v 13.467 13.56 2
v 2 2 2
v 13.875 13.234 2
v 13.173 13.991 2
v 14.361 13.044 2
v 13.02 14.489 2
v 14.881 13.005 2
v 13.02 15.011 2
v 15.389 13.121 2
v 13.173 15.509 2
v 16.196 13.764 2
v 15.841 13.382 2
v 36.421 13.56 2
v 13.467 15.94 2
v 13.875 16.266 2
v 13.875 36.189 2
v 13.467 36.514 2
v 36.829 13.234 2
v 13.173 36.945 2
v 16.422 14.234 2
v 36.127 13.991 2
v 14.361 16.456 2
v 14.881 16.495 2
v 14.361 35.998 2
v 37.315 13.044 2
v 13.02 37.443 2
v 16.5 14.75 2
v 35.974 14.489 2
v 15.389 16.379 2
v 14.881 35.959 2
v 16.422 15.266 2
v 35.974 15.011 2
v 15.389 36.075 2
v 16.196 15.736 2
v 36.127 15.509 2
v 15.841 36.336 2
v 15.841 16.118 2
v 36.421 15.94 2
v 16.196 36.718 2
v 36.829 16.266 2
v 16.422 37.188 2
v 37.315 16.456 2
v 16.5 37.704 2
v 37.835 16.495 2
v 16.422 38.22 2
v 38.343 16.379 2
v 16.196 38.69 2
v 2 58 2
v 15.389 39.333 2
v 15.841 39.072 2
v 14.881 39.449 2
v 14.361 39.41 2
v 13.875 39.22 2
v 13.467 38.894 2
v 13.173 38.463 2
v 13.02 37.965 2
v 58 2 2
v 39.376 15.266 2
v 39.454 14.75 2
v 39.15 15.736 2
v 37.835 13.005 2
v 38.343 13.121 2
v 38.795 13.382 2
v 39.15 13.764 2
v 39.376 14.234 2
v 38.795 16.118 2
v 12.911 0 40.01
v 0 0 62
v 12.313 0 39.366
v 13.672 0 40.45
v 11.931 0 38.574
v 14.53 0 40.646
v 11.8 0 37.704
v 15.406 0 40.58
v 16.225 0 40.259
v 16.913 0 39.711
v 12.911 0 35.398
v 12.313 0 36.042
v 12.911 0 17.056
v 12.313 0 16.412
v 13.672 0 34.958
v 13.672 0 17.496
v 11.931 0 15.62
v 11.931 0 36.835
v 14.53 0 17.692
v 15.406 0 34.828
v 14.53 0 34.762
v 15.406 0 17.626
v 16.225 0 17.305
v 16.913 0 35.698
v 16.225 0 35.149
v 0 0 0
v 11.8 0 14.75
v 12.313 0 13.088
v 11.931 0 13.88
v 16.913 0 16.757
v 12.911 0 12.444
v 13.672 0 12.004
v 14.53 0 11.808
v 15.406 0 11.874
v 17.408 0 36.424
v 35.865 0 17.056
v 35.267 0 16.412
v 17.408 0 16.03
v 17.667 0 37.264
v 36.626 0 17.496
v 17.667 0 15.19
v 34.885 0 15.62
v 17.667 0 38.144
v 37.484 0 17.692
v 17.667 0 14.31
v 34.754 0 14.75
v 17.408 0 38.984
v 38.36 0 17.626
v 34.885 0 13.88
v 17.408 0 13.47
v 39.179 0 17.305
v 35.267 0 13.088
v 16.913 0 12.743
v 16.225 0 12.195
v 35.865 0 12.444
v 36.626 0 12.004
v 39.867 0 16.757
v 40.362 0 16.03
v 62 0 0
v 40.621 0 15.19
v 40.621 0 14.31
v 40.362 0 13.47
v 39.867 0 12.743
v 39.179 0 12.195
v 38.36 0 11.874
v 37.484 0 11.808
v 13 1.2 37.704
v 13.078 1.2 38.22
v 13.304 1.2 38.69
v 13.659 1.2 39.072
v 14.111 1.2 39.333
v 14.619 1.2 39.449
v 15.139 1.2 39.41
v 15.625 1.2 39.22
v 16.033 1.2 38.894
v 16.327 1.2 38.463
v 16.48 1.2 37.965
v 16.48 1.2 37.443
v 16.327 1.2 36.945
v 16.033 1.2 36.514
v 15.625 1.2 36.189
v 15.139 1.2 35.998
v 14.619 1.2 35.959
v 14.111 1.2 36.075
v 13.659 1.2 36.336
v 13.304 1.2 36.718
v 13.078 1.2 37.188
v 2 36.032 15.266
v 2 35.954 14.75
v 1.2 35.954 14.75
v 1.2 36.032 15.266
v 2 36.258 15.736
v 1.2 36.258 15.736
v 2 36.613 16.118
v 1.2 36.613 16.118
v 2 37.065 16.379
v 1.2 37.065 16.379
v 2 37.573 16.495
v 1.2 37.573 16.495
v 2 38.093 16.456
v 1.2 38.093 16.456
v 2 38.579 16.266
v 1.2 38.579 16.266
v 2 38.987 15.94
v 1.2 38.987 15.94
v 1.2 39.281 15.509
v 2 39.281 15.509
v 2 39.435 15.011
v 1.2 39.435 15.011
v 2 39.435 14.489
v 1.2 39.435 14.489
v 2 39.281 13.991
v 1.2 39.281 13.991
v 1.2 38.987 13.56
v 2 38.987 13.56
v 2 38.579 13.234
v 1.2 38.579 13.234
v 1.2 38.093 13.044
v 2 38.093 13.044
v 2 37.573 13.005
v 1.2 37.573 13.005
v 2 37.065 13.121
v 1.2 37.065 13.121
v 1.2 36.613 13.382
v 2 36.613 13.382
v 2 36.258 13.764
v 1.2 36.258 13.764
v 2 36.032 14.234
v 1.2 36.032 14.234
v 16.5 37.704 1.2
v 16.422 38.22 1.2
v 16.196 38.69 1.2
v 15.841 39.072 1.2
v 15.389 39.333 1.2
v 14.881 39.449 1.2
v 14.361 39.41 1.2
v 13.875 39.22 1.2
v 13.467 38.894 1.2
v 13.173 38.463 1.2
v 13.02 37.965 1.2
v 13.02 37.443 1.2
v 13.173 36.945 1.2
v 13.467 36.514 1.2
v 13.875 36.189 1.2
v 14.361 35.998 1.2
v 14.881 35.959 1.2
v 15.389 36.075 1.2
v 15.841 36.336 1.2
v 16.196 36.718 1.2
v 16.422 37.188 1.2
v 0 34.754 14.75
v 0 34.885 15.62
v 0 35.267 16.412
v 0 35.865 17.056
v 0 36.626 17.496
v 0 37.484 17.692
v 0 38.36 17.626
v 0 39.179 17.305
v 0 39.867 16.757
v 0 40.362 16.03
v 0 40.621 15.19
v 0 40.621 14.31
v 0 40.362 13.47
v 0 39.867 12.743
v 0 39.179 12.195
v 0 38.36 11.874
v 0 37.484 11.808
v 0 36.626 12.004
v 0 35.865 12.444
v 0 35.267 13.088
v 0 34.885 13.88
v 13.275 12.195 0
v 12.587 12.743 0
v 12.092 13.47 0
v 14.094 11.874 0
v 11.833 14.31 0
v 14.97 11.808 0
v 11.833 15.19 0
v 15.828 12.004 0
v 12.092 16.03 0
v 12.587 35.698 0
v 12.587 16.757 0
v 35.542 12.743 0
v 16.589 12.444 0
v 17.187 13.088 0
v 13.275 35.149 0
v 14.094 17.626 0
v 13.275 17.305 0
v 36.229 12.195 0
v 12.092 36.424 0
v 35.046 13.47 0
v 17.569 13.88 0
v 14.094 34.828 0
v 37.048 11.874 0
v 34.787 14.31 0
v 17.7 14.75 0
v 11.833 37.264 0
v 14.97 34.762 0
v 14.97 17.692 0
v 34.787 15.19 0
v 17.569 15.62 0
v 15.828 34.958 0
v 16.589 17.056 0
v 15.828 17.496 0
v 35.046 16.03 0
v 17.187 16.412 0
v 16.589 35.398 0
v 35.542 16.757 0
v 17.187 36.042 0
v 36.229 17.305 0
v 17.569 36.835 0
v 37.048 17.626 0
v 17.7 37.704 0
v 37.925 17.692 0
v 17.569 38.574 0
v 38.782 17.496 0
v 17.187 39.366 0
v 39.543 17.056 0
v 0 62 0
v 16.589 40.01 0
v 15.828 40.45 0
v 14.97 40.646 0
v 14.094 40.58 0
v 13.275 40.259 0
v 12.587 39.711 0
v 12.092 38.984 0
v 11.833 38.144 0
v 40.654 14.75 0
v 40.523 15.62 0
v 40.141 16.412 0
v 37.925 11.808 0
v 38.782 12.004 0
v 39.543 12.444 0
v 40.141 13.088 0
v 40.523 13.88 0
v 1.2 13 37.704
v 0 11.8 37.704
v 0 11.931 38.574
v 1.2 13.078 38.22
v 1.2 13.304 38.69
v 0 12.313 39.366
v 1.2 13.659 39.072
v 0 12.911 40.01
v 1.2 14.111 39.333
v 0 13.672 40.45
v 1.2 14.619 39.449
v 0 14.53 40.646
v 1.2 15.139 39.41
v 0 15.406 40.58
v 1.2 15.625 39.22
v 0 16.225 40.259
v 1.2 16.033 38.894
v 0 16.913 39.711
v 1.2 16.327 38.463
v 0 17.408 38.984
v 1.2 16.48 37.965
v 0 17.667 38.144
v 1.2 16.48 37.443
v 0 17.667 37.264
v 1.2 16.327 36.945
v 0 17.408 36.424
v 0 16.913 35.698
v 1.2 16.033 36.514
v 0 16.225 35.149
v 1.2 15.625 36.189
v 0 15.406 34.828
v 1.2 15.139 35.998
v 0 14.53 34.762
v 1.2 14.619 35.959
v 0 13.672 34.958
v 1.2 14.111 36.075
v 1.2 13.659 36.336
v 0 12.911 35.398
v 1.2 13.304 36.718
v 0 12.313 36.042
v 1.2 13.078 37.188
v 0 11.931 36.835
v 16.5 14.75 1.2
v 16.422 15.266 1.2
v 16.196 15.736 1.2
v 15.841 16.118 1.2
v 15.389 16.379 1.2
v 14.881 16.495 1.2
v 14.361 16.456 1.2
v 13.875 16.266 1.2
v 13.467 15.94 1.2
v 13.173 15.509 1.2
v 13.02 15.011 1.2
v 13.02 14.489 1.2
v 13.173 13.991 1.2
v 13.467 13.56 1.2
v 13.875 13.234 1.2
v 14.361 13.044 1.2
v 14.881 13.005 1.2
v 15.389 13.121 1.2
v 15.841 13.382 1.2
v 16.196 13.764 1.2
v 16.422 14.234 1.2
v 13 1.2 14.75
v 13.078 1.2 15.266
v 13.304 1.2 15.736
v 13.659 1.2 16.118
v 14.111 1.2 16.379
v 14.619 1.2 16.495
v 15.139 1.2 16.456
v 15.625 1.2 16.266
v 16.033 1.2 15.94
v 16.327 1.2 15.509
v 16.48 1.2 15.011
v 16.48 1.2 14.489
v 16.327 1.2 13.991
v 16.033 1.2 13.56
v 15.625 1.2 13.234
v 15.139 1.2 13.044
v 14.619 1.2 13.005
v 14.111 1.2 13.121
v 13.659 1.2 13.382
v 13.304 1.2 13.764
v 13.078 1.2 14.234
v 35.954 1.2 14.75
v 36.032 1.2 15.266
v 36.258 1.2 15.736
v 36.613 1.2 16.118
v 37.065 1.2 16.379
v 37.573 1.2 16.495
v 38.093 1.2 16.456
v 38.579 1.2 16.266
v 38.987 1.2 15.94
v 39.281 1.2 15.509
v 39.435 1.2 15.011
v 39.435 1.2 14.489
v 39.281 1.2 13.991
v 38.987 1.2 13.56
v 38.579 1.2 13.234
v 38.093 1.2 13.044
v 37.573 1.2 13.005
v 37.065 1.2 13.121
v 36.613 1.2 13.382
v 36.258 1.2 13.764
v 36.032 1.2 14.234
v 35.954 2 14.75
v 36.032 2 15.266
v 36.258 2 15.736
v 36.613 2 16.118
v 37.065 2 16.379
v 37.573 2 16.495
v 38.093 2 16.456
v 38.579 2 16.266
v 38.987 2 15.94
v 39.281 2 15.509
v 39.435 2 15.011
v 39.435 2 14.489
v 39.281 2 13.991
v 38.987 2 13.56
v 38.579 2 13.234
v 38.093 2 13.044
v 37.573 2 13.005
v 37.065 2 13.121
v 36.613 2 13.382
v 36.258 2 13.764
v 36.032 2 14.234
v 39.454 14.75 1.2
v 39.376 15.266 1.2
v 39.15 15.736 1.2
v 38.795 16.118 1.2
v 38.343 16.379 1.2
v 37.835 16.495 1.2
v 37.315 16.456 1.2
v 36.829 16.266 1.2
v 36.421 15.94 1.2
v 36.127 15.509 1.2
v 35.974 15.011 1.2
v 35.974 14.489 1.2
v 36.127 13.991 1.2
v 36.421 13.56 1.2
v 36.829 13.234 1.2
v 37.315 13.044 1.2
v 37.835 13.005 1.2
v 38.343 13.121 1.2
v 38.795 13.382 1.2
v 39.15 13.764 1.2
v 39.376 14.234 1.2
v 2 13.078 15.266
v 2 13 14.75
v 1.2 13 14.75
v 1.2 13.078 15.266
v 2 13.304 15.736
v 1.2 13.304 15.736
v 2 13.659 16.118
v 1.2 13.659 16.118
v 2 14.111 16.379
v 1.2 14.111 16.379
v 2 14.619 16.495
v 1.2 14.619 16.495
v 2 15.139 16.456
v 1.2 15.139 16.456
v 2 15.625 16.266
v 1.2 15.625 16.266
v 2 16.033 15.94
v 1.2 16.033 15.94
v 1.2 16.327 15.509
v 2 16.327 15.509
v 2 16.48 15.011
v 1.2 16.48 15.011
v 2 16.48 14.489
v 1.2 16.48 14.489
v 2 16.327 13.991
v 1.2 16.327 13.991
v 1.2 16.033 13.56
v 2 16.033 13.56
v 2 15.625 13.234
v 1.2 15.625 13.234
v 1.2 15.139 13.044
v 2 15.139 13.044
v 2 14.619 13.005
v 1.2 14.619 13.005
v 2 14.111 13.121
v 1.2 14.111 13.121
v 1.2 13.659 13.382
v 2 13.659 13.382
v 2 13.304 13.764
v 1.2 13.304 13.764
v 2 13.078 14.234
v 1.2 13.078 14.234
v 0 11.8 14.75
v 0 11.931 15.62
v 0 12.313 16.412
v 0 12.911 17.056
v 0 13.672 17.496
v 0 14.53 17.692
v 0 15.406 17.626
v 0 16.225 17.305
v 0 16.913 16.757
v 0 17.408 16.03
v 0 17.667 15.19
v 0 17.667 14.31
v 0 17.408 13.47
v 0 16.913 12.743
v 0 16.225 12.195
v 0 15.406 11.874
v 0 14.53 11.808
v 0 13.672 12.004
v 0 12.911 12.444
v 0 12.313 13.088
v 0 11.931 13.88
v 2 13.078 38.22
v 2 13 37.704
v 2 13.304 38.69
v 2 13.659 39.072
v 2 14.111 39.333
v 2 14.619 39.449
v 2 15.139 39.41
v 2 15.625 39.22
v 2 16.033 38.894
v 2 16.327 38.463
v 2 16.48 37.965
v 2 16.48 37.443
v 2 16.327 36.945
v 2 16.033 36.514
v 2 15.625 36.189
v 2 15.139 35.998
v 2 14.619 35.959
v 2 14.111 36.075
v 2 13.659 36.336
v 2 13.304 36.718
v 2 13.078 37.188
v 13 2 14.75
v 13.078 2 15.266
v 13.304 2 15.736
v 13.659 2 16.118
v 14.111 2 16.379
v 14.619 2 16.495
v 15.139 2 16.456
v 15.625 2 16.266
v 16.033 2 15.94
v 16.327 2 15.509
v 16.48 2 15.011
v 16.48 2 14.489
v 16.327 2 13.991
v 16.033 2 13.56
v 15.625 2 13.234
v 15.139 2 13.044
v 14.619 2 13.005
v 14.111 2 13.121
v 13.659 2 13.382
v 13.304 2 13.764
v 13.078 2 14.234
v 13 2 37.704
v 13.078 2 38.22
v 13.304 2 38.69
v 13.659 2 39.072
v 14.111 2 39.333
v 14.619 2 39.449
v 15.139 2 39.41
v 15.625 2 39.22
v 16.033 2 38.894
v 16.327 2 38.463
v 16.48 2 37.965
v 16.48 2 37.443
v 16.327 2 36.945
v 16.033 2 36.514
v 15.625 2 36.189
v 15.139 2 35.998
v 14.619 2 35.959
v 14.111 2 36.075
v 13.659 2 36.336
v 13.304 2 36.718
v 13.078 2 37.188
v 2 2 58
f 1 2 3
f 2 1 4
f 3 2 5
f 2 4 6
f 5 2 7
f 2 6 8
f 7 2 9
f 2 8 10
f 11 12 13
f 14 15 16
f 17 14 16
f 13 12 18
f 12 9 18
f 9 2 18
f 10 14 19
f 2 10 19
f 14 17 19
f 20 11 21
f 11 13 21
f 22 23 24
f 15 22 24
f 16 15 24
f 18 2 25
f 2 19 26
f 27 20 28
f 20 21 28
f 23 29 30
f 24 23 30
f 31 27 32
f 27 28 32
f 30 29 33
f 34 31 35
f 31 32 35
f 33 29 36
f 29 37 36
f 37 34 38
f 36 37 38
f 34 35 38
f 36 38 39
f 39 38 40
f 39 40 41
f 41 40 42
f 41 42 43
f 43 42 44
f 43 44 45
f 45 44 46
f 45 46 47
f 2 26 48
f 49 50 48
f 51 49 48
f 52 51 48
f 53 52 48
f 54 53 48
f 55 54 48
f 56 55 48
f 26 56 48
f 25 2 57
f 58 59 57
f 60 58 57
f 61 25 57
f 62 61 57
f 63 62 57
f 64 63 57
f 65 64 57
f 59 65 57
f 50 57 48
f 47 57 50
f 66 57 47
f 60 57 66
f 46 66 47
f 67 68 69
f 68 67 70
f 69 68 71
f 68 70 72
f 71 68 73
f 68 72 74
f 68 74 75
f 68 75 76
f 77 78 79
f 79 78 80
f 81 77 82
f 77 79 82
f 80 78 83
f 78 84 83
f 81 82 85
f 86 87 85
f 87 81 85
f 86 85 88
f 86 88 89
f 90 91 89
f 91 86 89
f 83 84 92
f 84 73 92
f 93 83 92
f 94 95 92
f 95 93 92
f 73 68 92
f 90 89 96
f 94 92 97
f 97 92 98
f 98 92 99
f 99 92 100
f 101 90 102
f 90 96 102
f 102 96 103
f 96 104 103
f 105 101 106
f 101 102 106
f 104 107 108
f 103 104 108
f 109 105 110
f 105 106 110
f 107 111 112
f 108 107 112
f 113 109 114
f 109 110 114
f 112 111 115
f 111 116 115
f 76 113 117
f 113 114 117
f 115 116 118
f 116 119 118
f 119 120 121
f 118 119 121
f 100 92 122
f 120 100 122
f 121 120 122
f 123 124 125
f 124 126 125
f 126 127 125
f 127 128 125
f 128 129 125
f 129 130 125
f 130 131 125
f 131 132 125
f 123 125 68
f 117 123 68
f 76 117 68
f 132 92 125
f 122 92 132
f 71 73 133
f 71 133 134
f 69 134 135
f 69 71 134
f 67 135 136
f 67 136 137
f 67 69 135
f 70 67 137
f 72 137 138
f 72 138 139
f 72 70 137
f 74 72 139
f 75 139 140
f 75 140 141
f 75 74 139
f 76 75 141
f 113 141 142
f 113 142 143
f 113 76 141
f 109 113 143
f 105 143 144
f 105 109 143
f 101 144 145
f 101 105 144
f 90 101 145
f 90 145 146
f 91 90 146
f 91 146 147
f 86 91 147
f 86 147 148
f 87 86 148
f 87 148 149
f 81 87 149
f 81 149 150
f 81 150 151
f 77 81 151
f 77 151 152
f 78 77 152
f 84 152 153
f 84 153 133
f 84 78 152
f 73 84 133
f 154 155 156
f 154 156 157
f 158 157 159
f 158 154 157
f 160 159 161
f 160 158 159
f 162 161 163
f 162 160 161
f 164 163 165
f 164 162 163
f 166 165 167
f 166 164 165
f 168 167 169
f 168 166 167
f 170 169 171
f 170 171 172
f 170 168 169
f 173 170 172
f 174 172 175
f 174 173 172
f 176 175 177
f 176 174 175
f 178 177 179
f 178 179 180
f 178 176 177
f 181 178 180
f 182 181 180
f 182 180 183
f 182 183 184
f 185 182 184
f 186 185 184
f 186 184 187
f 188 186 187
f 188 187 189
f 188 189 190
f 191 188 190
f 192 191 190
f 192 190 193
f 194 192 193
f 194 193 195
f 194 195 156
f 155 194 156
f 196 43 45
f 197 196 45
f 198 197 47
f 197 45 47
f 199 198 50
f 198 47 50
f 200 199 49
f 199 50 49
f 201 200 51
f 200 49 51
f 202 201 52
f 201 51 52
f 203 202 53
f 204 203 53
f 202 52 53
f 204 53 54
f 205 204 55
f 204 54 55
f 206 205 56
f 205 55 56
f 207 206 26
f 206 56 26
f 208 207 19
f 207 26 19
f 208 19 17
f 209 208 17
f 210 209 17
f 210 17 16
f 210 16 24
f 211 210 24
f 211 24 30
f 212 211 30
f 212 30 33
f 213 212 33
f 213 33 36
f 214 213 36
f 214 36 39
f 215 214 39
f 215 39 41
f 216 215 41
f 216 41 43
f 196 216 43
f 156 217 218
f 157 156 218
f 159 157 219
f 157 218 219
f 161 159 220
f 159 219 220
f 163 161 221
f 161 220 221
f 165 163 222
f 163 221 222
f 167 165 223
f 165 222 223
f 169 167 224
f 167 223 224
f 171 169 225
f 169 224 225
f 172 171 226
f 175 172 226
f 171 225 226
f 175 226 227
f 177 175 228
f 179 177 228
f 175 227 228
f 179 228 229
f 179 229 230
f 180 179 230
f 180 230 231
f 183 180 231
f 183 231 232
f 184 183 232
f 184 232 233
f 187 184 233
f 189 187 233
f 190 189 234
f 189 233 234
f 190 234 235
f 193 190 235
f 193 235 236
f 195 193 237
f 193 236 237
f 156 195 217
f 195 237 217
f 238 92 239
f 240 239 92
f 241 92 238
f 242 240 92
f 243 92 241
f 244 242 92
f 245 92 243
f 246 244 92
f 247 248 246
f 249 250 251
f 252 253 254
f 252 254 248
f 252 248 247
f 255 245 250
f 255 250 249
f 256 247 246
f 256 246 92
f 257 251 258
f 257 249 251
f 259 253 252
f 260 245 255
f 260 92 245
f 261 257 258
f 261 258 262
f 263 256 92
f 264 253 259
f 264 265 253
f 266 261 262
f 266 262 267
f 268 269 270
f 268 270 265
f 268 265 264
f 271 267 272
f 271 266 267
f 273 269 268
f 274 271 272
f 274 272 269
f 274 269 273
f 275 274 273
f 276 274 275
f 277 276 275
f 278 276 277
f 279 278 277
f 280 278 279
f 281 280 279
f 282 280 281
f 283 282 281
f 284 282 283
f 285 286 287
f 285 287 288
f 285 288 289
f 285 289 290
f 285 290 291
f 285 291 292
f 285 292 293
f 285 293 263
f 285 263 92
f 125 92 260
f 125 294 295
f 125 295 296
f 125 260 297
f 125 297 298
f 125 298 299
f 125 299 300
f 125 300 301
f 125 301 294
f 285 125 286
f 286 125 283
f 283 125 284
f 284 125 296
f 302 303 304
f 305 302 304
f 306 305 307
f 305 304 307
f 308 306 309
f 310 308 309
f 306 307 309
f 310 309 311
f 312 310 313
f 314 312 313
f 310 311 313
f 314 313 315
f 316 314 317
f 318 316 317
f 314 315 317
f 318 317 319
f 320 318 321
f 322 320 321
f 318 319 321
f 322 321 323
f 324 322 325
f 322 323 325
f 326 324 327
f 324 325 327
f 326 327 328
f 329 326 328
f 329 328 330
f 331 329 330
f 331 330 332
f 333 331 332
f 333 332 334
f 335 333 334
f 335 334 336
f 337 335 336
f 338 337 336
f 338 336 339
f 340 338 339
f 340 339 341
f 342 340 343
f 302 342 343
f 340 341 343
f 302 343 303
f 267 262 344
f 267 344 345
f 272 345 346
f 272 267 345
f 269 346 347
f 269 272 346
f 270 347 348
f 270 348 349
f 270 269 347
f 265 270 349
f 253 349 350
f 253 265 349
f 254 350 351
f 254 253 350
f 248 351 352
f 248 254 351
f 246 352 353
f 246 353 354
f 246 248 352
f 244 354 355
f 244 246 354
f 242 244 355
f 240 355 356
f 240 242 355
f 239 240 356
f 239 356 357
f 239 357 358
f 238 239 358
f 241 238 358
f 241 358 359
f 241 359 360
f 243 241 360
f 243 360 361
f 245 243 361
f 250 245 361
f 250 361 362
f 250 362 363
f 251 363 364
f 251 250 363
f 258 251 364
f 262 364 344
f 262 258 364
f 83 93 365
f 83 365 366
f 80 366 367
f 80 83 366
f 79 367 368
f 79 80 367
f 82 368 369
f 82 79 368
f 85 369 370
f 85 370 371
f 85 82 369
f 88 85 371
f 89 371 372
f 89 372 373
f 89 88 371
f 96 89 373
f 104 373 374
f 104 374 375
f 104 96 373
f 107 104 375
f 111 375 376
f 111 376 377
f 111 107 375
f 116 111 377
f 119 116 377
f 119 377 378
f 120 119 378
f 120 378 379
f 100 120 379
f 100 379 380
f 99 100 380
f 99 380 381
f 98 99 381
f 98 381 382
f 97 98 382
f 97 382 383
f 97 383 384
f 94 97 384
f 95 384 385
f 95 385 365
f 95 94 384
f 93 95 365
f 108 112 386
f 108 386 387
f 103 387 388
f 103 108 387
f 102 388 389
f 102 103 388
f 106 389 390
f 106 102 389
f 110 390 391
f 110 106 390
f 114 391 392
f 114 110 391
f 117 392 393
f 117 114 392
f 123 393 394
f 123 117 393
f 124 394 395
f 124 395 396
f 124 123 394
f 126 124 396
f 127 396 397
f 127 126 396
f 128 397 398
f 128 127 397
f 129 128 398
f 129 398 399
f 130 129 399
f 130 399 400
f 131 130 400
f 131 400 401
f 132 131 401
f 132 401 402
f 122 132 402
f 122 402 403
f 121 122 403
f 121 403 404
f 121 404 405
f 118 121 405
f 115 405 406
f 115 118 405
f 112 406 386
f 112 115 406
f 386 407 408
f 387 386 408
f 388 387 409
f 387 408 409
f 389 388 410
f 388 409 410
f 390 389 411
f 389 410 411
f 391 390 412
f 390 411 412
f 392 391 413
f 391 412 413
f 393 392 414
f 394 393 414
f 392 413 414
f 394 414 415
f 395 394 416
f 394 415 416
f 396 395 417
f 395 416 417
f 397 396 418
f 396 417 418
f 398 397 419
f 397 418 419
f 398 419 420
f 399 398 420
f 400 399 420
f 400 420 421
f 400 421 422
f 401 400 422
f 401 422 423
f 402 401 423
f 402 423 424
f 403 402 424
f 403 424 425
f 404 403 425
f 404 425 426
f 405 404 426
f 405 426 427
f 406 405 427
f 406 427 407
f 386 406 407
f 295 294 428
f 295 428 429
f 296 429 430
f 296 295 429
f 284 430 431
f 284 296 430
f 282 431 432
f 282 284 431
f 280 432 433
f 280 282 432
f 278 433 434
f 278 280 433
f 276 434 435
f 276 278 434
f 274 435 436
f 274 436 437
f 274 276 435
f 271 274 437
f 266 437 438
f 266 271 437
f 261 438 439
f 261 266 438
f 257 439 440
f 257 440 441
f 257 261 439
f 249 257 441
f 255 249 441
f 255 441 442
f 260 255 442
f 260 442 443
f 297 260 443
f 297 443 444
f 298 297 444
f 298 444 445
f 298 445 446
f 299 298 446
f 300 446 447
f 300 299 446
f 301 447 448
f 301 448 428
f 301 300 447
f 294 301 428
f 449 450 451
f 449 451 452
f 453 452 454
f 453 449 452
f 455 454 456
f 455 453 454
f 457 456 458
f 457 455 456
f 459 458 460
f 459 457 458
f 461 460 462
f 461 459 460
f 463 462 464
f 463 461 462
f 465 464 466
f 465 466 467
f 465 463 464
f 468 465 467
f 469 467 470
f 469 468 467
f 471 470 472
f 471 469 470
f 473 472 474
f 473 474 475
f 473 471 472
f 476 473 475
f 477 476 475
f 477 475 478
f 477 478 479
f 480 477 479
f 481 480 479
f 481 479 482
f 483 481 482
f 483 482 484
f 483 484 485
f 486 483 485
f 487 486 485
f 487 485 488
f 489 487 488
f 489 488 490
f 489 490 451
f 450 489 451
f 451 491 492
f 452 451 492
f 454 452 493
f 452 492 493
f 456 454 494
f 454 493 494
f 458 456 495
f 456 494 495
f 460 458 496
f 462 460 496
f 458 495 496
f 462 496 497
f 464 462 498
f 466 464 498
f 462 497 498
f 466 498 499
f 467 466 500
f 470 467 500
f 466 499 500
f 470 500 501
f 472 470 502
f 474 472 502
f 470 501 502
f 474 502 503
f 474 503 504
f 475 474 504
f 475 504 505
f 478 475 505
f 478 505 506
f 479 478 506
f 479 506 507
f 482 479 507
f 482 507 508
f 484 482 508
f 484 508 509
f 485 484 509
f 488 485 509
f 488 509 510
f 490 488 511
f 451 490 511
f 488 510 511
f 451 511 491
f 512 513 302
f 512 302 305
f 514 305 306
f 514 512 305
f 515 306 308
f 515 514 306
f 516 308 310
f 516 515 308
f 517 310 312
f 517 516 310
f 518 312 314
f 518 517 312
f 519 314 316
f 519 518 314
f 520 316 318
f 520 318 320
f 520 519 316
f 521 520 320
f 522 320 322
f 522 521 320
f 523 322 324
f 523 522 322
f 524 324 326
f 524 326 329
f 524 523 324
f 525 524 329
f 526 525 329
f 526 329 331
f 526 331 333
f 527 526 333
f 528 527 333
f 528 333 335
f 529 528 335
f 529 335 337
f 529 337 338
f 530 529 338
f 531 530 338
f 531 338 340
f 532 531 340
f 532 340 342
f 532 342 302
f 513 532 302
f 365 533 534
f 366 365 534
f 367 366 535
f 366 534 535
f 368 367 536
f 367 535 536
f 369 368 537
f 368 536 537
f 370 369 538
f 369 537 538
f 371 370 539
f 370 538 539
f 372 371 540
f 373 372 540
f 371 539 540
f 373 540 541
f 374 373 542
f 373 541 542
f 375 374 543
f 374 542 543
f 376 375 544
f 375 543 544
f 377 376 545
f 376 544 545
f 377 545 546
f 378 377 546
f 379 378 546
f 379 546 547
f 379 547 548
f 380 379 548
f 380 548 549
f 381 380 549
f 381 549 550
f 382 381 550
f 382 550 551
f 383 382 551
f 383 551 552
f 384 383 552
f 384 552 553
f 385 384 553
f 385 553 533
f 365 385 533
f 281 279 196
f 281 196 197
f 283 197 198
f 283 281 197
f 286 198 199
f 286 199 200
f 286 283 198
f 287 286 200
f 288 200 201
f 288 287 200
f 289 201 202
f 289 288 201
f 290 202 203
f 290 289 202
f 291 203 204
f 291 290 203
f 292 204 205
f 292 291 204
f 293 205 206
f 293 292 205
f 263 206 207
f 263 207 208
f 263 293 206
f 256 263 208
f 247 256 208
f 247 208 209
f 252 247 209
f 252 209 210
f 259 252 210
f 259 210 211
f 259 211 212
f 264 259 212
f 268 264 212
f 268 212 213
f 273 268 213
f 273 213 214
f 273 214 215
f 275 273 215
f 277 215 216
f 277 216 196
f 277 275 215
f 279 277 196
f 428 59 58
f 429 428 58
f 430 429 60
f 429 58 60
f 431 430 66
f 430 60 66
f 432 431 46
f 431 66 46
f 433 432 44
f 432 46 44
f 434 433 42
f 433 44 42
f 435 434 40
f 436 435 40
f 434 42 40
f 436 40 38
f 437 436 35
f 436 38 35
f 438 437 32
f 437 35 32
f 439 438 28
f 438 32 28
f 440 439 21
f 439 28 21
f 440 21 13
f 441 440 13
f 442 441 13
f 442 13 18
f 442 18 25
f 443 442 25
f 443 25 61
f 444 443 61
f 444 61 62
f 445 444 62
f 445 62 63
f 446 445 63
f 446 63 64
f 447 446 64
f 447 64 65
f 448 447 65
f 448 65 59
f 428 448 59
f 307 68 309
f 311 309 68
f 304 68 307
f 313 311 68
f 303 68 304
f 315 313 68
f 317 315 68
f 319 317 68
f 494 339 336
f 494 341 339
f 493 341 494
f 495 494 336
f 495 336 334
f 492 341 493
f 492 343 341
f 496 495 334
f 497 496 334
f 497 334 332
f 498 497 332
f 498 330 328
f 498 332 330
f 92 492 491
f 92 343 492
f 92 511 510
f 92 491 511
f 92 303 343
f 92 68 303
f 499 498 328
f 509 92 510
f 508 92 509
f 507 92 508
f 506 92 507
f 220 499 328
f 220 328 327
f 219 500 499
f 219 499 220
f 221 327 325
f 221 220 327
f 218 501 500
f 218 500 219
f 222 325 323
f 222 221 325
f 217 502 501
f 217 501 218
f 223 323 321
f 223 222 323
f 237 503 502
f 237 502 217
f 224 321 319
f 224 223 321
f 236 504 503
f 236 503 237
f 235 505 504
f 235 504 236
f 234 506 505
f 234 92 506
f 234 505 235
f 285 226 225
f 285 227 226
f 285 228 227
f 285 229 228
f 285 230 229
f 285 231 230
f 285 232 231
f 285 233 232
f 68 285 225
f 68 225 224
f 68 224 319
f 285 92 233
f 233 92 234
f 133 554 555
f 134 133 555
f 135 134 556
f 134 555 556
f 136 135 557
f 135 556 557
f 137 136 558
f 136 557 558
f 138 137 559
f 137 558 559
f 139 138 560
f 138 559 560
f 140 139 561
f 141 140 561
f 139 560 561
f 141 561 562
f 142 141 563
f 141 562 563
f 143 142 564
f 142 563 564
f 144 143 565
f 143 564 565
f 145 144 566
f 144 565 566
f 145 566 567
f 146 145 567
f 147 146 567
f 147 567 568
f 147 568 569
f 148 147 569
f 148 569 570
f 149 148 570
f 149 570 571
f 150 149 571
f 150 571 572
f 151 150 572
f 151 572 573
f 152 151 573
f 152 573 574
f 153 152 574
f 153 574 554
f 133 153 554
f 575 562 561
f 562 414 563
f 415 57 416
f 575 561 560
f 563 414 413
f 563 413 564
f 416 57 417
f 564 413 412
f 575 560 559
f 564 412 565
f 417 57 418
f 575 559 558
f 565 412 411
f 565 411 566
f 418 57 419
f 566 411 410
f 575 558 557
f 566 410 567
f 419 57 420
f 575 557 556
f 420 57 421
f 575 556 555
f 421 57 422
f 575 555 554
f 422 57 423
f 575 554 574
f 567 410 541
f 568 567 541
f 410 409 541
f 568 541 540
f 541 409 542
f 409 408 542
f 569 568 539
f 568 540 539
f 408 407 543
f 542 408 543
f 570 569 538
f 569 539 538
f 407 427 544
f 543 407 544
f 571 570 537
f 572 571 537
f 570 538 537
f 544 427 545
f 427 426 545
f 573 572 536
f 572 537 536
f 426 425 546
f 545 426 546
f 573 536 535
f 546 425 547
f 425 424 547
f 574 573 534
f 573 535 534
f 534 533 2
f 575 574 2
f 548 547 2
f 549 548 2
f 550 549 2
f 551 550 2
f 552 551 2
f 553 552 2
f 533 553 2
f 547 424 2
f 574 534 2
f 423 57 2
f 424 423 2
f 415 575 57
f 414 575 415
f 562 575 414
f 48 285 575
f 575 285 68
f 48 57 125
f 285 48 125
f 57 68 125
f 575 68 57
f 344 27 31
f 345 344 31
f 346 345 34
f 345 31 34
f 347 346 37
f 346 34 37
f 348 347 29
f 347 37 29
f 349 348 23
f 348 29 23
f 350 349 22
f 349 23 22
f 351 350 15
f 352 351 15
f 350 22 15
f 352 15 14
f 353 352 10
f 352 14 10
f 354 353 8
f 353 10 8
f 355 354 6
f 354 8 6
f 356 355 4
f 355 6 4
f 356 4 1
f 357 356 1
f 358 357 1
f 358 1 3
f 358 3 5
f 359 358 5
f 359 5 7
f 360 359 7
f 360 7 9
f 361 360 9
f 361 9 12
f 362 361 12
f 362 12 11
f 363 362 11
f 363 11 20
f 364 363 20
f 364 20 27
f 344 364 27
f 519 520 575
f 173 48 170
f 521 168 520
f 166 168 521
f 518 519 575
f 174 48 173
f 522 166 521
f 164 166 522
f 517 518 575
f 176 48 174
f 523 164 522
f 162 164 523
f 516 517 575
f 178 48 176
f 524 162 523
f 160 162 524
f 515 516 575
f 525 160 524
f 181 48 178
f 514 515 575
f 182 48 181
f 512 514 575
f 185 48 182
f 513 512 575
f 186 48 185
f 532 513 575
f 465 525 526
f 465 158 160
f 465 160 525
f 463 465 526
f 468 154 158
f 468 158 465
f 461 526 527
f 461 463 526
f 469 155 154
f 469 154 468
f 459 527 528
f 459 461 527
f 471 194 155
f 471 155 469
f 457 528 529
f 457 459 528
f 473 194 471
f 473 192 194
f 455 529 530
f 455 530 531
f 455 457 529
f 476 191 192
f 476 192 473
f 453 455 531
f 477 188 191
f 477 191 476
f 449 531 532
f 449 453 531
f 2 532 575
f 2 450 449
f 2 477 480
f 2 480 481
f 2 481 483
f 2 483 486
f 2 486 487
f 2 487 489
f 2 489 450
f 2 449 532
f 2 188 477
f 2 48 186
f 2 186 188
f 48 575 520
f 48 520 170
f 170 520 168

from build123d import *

# Parameters (mm, degrees)
F1_DEPTH  = 2
F3_DEPTH  = 60
F5_DEPTH  = 31.001
F6_R      = 1.75
F7_DEPTH  = 2.001
F9_R      = 1.75
F10_DEPTH = 2.001
F13_DEPTH = 71.5924333795
F14_SIZE  = 1.2


with BuildPart() as f1:
    # F0 (on Top) → F1 (new body)
    with BuildSketch(Plane.XY):
        Polygon((62, 0), (31, 31), (0, 0), align=None)
    extrude(amount=F1_DEPTH)

    # F2 (on face) → F3 (join)
    with BuildSketch(Plane.XY.offset(2)):
        Polygon((2, 2), (0, 0), (62, 0), (60, 2), align=None)
    extrude(amount=F3_DEPTH)

    # F4 (on face) → F5 (cut, through all)
    with BuildSketch(Plane.XZ):
        Polygon((62, 62), (0, 62), (62, 0), align=None)
    extrude(amount=-F5_DEPTH, mode=Mode.SUBTRACT)

    # F6 (on face) → F7 (cut, through all)
    with BuildSketch(Plane(origin=(0, 2, 0), x_dir=(-1, 0, 0), z_dir=(0, 1, 0))):
        with Locations((-14.75, 14.75)):
            Circle(F6_R)
        with Locations((-14.75, 37.704058454)):
            Circle(F6_R)
        with Locations((-37.704058454, 14.75)):
            Circle(F6_R)
    extrude(amount=-F7_DEPTH, mode=Mode.SUBTRACT)

    # F8: F1 across face


with BuildPart() as f1_1:
    add(f1.part)
    add(f1.part.mirror(Plane(origin=(5.9907407407, 5.9907407407, 20.9962962963), x_dir=(-0.7071067812, -0.7071067812, 0), z_dir=(-0.7071067812, 0.7071067812, 0))))

    # F9 (on face) → F10 (cut, through all)
    with BuildSketch(Plane.XY.offset(2)):
        with Locations((14.75, 14.75)):
            Circle(F9_R)
        with Locations((37.704058454, 14.75)):
            Circle(F9_R)
        with Locations((14.75, 37.704058454)):
            Circle(F9_R)
    extrude(amount=-F10_DEPTH, mode=Mode.SUBTRACT)

    # F12 (on 3pt) → F13 (cut, through all)
    with BuildSketch(Plane(origin=(20.6666666667, 20.6666666667, 20.6666666667), x_dir=(0.8164965809, -0.4082482905, -0.4082482905), z_dir=(-0.5773502692, -0.5773502692, -0.5773502692))):
        Polygon((-25.3113940088, -43.8406204336), (50.6227880175, 0), (-25.3113940088, 43.8406204336), align=None)
    extrude(amount=-F13_DEPTH, mode=Mode.SUBTRACT)

    # F14
    f14_edges = [f1_1.edges().sort_by_distance(p)[0] for p in [
        (13, 37.704058, 0),
        (13, 14.75, 0),
        (35.954058, 14.75, 0),
        (0, 16.5, 14.75),
        (0, 39.454058, 14.75),
        (0, 16.5, 37.704058),
        (16.5, 0, 37.704058),
        (39.454058, 0, 14.75),
        (16.5, 0, 14.75),
    ]]
    chamfer(f14_edges, length=F14_SIZE)


solid = f1_1.part
